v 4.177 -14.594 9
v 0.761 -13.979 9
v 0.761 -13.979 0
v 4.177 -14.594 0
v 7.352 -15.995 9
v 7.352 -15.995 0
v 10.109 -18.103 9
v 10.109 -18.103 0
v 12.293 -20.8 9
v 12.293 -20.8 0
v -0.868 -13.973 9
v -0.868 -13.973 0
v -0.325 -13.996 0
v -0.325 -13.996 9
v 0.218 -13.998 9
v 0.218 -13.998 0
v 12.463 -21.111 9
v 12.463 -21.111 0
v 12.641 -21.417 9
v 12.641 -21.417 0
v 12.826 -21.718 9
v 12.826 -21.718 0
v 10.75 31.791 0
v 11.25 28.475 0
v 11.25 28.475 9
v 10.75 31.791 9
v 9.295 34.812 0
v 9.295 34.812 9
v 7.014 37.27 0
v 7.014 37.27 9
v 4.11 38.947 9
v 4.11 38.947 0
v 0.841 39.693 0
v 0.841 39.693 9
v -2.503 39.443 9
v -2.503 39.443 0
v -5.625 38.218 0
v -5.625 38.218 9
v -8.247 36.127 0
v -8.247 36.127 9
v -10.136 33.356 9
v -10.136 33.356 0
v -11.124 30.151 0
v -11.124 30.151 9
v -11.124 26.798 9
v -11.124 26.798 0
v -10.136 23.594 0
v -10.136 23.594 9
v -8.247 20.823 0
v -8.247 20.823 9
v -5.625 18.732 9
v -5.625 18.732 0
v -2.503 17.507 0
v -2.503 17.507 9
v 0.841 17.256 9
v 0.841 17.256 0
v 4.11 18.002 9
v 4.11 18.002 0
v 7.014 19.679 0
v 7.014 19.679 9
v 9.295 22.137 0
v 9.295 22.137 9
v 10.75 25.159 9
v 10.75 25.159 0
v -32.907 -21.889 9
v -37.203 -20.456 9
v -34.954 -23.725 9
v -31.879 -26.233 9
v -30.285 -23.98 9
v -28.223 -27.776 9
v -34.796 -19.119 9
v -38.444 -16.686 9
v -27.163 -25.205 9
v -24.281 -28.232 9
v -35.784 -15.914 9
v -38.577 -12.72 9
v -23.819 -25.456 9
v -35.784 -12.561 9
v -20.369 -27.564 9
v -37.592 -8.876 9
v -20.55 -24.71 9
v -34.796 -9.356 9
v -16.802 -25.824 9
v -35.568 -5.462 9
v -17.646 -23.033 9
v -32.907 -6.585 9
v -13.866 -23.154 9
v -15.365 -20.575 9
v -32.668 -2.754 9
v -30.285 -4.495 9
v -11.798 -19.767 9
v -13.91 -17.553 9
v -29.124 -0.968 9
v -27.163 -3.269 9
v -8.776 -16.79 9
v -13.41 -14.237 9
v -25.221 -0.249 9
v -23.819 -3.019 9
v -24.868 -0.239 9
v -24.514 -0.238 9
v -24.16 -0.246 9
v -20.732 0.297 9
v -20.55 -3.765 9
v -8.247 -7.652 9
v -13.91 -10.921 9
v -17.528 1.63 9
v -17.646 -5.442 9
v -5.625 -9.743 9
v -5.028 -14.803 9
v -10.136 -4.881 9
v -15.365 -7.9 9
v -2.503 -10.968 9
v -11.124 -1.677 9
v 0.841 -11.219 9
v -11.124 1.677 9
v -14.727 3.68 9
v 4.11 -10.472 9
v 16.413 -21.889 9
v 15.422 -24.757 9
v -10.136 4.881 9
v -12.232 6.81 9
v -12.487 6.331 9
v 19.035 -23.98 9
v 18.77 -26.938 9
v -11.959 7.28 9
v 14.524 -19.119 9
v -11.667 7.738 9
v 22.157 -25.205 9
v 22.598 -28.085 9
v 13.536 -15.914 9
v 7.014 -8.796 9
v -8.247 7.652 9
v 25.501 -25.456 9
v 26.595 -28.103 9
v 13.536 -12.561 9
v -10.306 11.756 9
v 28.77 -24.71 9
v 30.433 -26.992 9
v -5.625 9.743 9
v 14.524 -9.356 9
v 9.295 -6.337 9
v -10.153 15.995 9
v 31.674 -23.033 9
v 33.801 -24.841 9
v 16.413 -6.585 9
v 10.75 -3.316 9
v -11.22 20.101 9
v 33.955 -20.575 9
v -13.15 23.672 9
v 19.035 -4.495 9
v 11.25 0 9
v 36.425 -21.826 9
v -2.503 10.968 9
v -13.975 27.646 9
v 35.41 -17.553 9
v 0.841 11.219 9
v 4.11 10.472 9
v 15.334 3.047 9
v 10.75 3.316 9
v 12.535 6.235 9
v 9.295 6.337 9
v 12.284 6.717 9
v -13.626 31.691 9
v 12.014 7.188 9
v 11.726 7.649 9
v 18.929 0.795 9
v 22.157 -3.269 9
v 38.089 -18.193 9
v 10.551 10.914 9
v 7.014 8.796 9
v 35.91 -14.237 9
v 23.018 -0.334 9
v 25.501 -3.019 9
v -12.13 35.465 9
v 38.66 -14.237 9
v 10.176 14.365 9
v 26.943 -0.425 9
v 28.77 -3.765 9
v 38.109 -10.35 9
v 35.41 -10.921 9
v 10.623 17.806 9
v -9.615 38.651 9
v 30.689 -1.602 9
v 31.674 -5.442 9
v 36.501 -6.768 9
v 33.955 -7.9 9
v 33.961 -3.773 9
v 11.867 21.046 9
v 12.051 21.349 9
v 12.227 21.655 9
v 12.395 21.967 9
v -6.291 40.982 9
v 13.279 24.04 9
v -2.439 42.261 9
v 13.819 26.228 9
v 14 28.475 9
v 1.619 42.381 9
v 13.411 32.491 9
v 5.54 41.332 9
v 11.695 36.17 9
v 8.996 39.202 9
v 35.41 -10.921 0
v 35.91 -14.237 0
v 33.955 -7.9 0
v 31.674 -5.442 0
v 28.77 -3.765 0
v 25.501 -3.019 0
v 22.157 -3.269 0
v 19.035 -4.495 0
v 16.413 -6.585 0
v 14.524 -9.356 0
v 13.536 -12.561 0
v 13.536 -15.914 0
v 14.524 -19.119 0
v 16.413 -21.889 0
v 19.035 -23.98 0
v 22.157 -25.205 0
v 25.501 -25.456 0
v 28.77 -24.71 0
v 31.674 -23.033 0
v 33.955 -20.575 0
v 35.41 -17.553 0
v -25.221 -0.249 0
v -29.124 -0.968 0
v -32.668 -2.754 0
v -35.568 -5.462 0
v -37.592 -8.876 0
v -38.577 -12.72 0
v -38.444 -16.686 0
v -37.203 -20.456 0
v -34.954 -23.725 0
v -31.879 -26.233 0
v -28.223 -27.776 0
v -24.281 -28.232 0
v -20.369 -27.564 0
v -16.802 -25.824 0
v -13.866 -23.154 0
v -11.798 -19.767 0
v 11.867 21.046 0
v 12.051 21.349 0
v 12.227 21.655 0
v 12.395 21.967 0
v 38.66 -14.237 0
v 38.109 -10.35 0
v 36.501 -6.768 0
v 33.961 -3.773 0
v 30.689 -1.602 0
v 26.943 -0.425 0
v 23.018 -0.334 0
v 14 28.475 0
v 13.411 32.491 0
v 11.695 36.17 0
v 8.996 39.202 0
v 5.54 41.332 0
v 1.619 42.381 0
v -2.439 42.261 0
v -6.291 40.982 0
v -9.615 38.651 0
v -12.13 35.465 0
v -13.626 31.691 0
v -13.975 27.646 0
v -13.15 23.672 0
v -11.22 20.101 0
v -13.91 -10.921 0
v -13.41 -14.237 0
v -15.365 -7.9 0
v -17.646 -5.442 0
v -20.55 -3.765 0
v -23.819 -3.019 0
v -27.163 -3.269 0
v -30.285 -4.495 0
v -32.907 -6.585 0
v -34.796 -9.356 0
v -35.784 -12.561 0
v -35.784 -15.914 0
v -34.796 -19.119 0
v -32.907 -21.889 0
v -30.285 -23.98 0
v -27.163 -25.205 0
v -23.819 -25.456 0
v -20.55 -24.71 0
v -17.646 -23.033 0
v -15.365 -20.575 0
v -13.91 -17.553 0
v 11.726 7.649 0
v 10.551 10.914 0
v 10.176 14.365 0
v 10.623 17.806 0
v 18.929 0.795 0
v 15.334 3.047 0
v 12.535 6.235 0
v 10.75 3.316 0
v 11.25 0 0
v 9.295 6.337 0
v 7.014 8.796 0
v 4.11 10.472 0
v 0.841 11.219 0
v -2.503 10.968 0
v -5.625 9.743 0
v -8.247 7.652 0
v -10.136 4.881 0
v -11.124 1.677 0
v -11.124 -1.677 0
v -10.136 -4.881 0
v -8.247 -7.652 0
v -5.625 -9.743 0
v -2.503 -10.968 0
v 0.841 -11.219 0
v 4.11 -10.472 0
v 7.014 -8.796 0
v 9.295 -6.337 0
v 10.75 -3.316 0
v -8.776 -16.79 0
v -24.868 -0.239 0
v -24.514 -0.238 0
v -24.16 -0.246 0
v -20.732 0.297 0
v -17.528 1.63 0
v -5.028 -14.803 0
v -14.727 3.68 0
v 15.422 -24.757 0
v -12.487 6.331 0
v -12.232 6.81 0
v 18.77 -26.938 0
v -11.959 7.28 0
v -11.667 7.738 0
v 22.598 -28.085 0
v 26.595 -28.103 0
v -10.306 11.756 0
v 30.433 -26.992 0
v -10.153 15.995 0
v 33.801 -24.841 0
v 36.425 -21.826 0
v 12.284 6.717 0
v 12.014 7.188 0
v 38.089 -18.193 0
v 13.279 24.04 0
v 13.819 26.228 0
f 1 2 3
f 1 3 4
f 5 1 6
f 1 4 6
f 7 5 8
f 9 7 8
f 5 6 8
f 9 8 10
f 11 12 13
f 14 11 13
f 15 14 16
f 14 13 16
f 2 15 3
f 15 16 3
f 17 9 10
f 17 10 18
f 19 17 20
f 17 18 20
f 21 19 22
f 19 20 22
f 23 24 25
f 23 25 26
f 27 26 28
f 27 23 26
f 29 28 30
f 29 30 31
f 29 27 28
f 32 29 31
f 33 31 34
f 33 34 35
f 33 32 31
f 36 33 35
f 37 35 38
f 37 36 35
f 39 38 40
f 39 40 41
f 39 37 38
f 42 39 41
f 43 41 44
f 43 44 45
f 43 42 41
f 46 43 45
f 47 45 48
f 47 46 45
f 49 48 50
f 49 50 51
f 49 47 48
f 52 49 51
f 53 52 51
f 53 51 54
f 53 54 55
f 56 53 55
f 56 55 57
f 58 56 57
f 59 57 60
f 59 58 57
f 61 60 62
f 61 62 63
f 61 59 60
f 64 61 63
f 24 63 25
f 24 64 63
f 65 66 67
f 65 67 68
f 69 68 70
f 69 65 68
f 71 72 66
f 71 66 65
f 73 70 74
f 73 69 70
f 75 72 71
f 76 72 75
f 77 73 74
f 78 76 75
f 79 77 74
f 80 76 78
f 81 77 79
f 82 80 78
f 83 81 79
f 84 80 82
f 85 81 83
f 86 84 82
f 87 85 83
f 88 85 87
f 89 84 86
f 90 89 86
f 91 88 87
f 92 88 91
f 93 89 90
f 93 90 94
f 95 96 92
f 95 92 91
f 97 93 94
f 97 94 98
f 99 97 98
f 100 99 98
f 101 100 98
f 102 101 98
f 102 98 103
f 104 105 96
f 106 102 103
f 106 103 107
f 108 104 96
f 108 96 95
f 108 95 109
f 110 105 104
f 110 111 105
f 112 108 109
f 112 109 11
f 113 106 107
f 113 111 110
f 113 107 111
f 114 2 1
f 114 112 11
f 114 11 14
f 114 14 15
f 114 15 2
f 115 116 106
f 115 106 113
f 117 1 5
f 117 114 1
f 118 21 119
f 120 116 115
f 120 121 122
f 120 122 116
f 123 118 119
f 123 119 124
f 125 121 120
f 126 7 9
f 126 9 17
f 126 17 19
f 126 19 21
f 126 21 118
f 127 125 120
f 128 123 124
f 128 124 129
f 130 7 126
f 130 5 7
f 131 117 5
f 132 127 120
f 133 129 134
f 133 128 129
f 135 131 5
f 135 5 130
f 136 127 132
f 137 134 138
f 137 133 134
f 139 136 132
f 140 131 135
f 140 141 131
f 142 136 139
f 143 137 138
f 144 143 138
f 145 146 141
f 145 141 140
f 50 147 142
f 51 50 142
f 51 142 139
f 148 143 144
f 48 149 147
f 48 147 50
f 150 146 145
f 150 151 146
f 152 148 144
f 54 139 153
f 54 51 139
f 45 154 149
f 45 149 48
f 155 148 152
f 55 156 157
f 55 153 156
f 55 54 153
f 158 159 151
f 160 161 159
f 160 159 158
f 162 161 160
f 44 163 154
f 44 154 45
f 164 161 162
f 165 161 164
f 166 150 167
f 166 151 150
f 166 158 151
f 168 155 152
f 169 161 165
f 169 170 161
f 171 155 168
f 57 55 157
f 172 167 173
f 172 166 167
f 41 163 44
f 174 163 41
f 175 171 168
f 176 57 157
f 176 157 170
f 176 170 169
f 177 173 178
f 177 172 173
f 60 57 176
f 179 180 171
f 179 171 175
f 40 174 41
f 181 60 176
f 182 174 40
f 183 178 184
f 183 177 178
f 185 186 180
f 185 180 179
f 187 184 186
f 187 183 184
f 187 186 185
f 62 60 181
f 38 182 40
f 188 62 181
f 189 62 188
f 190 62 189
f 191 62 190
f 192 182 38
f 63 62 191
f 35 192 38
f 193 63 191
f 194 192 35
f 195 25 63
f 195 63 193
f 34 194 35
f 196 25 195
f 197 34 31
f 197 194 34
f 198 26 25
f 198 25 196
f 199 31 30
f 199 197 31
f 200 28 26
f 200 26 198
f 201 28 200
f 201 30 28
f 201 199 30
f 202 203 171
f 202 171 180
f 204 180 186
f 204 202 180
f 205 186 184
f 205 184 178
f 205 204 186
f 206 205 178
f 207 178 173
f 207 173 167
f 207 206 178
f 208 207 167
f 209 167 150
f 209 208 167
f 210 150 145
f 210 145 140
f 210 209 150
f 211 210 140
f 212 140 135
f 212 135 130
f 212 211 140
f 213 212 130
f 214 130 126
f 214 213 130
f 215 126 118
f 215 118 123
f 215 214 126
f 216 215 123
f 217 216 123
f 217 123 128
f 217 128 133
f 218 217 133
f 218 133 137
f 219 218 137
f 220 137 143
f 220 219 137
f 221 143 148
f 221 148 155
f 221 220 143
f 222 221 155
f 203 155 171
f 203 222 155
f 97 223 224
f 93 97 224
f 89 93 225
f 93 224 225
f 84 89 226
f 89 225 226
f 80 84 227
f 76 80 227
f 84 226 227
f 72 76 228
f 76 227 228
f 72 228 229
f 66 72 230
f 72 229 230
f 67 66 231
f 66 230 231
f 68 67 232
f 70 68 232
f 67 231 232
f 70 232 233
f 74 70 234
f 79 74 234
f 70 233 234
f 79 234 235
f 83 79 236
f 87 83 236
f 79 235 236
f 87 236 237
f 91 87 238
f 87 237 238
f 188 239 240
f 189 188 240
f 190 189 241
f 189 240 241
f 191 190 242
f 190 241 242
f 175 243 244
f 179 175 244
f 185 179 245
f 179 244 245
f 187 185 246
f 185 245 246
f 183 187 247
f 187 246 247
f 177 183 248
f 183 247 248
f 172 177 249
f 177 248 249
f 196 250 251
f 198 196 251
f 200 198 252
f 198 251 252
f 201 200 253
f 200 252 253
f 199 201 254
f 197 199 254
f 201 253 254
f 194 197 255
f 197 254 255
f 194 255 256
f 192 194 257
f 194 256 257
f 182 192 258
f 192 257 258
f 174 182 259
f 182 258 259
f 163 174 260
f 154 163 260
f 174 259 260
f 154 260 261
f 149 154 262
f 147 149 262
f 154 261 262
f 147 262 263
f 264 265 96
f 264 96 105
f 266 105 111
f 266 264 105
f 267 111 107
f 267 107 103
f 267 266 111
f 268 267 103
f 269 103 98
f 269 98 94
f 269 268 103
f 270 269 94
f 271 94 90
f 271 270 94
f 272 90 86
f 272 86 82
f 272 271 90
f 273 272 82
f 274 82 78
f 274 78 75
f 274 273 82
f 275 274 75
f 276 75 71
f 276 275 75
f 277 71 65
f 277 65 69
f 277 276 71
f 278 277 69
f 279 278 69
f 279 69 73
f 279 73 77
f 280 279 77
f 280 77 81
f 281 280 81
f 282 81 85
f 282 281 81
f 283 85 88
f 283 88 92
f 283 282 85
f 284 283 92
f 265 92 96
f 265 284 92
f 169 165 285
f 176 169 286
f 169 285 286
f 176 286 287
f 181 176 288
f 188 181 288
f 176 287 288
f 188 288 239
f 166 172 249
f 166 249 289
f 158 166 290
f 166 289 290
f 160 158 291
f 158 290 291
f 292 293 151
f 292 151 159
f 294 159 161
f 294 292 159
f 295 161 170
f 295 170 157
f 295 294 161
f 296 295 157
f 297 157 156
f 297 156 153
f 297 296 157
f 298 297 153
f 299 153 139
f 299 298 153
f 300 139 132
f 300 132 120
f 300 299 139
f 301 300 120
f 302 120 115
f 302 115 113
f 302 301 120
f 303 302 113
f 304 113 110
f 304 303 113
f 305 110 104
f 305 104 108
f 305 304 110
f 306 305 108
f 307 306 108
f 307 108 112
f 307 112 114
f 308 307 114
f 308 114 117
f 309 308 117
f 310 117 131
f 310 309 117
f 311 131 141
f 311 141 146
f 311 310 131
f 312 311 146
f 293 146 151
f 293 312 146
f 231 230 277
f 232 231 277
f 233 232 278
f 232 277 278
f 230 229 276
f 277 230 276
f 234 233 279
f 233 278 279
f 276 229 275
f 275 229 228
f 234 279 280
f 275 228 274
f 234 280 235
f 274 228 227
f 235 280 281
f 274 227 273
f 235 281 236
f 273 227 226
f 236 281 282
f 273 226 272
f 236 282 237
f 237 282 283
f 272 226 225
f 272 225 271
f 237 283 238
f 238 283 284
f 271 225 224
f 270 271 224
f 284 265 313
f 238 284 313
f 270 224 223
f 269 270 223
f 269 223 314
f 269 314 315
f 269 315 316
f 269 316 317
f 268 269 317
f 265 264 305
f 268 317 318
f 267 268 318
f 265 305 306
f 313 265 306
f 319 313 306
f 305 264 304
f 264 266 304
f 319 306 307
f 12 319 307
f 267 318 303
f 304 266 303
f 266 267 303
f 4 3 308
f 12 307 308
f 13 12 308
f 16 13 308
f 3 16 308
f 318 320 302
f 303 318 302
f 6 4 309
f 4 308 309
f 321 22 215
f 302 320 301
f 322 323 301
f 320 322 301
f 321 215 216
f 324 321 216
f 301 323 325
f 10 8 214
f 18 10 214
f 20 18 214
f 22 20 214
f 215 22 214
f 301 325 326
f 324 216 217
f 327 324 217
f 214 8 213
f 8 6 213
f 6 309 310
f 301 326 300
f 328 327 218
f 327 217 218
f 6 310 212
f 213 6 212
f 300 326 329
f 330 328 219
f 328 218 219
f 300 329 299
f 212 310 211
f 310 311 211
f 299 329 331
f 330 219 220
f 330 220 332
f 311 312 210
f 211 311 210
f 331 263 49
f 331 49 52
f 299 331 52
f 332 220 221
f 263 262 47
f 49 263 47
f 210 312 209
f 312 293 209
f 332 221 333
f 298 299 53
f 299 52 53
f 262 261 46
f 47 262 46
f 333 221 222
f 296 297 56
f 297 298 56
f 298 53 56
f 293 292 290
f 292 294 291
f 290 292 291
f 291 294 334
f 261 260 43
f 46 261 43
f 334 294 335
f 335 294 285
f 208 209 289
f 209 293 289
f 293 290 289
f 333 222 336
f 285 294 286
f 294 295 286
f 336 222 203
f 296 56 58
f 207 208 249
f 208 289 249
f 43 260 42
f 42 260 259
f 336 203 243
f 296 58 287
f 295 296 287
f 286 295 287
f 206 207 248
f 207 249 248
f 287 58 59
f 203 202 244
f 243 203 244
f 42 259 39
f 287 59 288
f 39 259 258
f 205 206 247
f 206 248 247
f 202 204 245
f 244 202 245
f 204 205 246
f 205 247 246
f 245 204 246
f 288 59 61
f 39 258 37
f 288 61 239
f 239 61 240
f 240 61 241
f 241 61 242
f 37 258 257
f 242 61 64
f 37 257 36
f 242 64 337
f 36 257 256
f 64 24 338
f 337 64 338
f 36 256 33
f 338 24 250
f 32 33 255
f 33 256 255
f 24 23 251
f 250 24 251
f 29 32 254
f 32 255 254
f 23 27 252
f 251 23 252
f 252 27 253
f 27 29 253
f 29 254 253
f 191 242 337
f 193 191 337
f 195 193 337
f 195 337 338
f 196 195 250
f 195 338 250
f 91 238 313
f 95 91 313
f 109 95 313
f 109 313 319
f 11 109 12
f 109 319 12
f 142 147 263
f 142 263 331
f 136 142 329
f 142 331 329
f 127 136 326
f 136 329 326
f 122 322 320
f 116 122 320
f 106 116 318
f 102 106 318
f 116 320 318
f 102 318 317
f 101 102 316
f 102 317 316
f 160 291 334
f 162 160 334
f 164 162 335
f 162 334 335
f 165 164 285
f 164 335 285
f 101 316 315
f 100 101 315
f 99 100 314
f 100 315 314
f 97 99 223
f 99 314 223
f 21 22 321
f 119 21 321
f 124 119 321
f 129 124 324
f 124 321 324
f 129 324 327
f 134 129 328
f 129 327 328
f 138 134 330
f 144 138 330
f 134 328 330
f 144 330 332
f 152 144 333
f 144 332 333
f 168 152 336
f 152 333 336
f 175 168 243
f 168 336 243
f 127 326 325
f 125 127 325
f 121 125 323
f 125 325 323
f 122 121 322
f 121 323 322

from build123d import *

# Parameters (mm, degrees)
F0_R     = 11.25
F1_DEPTH = 9


with BuildPart() as f1:
    # F0 (on Top) → F1 (new body)
    with BuildSketch(Plane.XY):
        with BuildLine():
            ThreePointArc((0.7608400883, -13.9793105109), (10.1649338718, -9.6267398107), (14, 0))
            ThreePointArc((14, 0), (13.6288181517, 3.2023921975), (12.5349548876, 6.2349744158))
            ThreePointArc((12.5349548876, 6.2349744158), (12.110837047, 6.930523737), (11.7260179857, 7.6485621001))
            ThreePointArc((11.7260179857, 7.6485621001), (0.0535862893, 13.9998974464), (-11.6671236798, 7.73810216))
            ThreePointArc((-11.6671236798, 7.73810216), (-12.0574281413, 7.0230306753), (-12.486858074, 6.3307484108))
            ThreePointArc((-12.486858074, 6.3307484108), (-12.1510599836, -6.9535416354), (-0.8678312078, -13.9730765759))
            ThreePointArc((-0.8678312078, -13.9730765759), (-0.0534089057, -13.9535544123), (0.7608400883, -13.9793105109))
        make_face()
        Circle(F0_R, mode=Mode.SUBTRACT)
        with BuildLine():
            ThreePointArc((12.5349548876, 6.2349744158), (13.6288181517, 3.2023921975), (14, 0))
            ThreePointArc((14, 0), (10.1649338718, -9.6267398107), (0.7608400883, -13.9793105109))
            ThreePointArc((0.7608400883, -13.9793105109), (7.352091686, -15.9948371419), (12.2933676324, -20.8001193652))
            ThreePointArc((12.2933676324, -20.8001193652), (12.2592417259, -7.7393660933), (23.0177448502, -0.3340267271))
            ThreePointArc((23.0177448502, -0.3340267271), (17.0493592663, 1.7903446823), (12.5349548876, 6.2349744158))
        make_face()
        with BuildLine():
            ThreePointArc((11.7260179857, 7.6485621001), (12.110837047, 6.930523737), (12.5349548876, 6.2349744158))
            ThreePointArc((12.5349548876, 6.2349744158), (12.1510599836, 6.9535416354), (11.7260179857, 7.6485621001))
        make_face()
        with BuildLine():
            ThreePointArc((-0.8678312078, -13.9730765759), (-0.0535862893, -13.9998974464), (0.7608400883, -13.9793105109))
            ThreePointArc((0.7608400883, -13.9793105109), (-0.0534089057, -13.9535544123), (-0.8678312078, -13.9730765759))
        make_face()
        with BuildLine():
            ThreePointArc((-11.6671236798, 7.73810216), (0.0535862893, 13.9998974464), (11.7260179857, 7.6485621001))
            ThreePointArc((11.7260179857, 7.6485621001), (10.1758894553, 14.3645171298), (11.8667483176, 21.0464290365))
            ThreePointArc((11.8667483176, 21.0464290365), (0.5728671472, 14.4864978581), (-11.2195968121, 20.1009651281))
            ThreePointArc((-11.2195967939, 20.1009651416), (-10.0751636095, 13.8700059017), (-11.6671236798, 7.73810216))
        make_face()
        with BuildLine():
            ThreePointArc((38.6598761714, -14.2373862032), (33.9606869292, -3.7734042055), (23.0177448502, -0.3340267271))
            ThreePointArc((23.0177448502, -0.3340267271), (12.2592417259, -7.7393660933), (12.2933676324, -20.8001193652))
            ThreePointArc((12.2933676324, -20.8001193652), (12.5679698707, -21.254196273), (12.8259555181, -21.7179156204))
            ThreePointArc((12.8259554695, -21.7179156511), (28.5537887393, -27.6849675811), (38.6598761714, -14.2373862032))
        make_face()
        with Locations((24.6598761714, -14.2373862032)):
            Circle(F0_R, mode=Mode.SUBTRACT)
        with BuildLine():
            ThreePointArc((-11.7981480563, -19.7669384146), (-6.9741956568, -15.660350584), (-0.8678312078, -13.9730765759))
            ThreePointArc((-0.8678312078, -13.9730765759), (-12.1510599836, -6.9535416354), (-12.486858074, 6.3307484108))
            ThreePointArc((-12.486858074, 6.3307484108), (-17.5279813167, 1.6303202988), (-24.1601159998, -0.246309001))
            ThreePointArc((-24.1601159998, -0.246309001), (-14.5852387143, -4.5161887863), (-10.659876271, -14.2373861458))
            ThreePointArc((-10.659876271, -14.2373861458), (-10.9473966527, -17.0601335163), (-11.7981480879, -19.766938401))
        make_face()
        with BuildLine():
            ThreePointArc((12.8259555181, -21.7179156204), (12.5679698707, -21.254196273), (12.2933676324, -20.8001193652))
            ThreePointArc((12.2933676324, -20.8001193652), (12.550962869, -21.2640652647), (12.8259554695, -21.7179156511))
        make_face()
        with BuildLine():
            ThreePointArc((-12.486858074, 6.3307484108), (-12.0574281413, 7.0230306753), (-11.6671236798, 7.73810216))
            ThreePointArc((-11.6671236798, 7.73810216), (-12.0974736943, 7.046355811), (-12.486858074, 6.3307484108))
        make_face()
        with BuildLine():
            ThreePointArc((12.3952888855, 21.9665611167), (12.1226891672, 21.5112796549), (11.8667483176, 21.0464290365))
            ThreePointArc((11.8667483176, 21.0464290365), (12.1397394153, 21.5014856829), (12.3952888855, 21.9665611167))
        make_face()
        with BuildLine():
            ThreePointArc((-11.2195968121, 20.1009651281), (0.5728671472, 14.4864978581), (11.8667483176, 21.0464290365))
            ThreePointArc((11.8667483176, 21.0464290365), (12.1226891672, 21.5112796549), (12.3952888855, 21.9665611167))
            ThreePointArc((12.3952888855, 21.9665611167), (13.5929033763, 25.1232088629), (14, 28.474772349))
            ThreePointArc((14, 28.474772349), (-4.4116688809, 41.7615017315), (-11.2195968121, 20.1009651281))
        make_face()
        with Locations((0, 28.474772349)):
            Circle(F0_R, mode=Mode.SUBTRACT)
        with BuildLine():
            ThreePointArc((-25.2212444048, -0.2486454655), (-36.1952849813, -22.1705031804), (-11.7981480879, -19.766938401))
            ThreePointArc((-11.7981480879, -19.766938401), (-10.9473966527, -17.0601335163), (-10.659876271, -14.2373861458))
            ThreePointArc((-10.659876271, -14.2373861458), (-14.5852387143, -4.5161887863), (-24.1601159998, -0.246309001))
            ThreePointArc((-24.1601159998, -0.246309001), (-24.6906590507, -0.257083046), (-25.2212444036, -0.2486454962))
        make_face()
        with Locations((-24.659876271, -14.2373861458)):
            Circle(F0_R, mode=Mode.SUBTRACT)
        with BuildLine():
            ThreePointArc((-25.2212444036, -0.2486454962), (-24.6906590507, -0.257083046), (-24.1601159998, -0.246309001))
            ThreePointArc((-24.1601159998, -0.246309001), (-24.6907023468, -0.2374200832), (-25.2212444048, -0.2486454655))
        make_face()
    extrude(amount=F1_DEPTH)


solid = f1.part
